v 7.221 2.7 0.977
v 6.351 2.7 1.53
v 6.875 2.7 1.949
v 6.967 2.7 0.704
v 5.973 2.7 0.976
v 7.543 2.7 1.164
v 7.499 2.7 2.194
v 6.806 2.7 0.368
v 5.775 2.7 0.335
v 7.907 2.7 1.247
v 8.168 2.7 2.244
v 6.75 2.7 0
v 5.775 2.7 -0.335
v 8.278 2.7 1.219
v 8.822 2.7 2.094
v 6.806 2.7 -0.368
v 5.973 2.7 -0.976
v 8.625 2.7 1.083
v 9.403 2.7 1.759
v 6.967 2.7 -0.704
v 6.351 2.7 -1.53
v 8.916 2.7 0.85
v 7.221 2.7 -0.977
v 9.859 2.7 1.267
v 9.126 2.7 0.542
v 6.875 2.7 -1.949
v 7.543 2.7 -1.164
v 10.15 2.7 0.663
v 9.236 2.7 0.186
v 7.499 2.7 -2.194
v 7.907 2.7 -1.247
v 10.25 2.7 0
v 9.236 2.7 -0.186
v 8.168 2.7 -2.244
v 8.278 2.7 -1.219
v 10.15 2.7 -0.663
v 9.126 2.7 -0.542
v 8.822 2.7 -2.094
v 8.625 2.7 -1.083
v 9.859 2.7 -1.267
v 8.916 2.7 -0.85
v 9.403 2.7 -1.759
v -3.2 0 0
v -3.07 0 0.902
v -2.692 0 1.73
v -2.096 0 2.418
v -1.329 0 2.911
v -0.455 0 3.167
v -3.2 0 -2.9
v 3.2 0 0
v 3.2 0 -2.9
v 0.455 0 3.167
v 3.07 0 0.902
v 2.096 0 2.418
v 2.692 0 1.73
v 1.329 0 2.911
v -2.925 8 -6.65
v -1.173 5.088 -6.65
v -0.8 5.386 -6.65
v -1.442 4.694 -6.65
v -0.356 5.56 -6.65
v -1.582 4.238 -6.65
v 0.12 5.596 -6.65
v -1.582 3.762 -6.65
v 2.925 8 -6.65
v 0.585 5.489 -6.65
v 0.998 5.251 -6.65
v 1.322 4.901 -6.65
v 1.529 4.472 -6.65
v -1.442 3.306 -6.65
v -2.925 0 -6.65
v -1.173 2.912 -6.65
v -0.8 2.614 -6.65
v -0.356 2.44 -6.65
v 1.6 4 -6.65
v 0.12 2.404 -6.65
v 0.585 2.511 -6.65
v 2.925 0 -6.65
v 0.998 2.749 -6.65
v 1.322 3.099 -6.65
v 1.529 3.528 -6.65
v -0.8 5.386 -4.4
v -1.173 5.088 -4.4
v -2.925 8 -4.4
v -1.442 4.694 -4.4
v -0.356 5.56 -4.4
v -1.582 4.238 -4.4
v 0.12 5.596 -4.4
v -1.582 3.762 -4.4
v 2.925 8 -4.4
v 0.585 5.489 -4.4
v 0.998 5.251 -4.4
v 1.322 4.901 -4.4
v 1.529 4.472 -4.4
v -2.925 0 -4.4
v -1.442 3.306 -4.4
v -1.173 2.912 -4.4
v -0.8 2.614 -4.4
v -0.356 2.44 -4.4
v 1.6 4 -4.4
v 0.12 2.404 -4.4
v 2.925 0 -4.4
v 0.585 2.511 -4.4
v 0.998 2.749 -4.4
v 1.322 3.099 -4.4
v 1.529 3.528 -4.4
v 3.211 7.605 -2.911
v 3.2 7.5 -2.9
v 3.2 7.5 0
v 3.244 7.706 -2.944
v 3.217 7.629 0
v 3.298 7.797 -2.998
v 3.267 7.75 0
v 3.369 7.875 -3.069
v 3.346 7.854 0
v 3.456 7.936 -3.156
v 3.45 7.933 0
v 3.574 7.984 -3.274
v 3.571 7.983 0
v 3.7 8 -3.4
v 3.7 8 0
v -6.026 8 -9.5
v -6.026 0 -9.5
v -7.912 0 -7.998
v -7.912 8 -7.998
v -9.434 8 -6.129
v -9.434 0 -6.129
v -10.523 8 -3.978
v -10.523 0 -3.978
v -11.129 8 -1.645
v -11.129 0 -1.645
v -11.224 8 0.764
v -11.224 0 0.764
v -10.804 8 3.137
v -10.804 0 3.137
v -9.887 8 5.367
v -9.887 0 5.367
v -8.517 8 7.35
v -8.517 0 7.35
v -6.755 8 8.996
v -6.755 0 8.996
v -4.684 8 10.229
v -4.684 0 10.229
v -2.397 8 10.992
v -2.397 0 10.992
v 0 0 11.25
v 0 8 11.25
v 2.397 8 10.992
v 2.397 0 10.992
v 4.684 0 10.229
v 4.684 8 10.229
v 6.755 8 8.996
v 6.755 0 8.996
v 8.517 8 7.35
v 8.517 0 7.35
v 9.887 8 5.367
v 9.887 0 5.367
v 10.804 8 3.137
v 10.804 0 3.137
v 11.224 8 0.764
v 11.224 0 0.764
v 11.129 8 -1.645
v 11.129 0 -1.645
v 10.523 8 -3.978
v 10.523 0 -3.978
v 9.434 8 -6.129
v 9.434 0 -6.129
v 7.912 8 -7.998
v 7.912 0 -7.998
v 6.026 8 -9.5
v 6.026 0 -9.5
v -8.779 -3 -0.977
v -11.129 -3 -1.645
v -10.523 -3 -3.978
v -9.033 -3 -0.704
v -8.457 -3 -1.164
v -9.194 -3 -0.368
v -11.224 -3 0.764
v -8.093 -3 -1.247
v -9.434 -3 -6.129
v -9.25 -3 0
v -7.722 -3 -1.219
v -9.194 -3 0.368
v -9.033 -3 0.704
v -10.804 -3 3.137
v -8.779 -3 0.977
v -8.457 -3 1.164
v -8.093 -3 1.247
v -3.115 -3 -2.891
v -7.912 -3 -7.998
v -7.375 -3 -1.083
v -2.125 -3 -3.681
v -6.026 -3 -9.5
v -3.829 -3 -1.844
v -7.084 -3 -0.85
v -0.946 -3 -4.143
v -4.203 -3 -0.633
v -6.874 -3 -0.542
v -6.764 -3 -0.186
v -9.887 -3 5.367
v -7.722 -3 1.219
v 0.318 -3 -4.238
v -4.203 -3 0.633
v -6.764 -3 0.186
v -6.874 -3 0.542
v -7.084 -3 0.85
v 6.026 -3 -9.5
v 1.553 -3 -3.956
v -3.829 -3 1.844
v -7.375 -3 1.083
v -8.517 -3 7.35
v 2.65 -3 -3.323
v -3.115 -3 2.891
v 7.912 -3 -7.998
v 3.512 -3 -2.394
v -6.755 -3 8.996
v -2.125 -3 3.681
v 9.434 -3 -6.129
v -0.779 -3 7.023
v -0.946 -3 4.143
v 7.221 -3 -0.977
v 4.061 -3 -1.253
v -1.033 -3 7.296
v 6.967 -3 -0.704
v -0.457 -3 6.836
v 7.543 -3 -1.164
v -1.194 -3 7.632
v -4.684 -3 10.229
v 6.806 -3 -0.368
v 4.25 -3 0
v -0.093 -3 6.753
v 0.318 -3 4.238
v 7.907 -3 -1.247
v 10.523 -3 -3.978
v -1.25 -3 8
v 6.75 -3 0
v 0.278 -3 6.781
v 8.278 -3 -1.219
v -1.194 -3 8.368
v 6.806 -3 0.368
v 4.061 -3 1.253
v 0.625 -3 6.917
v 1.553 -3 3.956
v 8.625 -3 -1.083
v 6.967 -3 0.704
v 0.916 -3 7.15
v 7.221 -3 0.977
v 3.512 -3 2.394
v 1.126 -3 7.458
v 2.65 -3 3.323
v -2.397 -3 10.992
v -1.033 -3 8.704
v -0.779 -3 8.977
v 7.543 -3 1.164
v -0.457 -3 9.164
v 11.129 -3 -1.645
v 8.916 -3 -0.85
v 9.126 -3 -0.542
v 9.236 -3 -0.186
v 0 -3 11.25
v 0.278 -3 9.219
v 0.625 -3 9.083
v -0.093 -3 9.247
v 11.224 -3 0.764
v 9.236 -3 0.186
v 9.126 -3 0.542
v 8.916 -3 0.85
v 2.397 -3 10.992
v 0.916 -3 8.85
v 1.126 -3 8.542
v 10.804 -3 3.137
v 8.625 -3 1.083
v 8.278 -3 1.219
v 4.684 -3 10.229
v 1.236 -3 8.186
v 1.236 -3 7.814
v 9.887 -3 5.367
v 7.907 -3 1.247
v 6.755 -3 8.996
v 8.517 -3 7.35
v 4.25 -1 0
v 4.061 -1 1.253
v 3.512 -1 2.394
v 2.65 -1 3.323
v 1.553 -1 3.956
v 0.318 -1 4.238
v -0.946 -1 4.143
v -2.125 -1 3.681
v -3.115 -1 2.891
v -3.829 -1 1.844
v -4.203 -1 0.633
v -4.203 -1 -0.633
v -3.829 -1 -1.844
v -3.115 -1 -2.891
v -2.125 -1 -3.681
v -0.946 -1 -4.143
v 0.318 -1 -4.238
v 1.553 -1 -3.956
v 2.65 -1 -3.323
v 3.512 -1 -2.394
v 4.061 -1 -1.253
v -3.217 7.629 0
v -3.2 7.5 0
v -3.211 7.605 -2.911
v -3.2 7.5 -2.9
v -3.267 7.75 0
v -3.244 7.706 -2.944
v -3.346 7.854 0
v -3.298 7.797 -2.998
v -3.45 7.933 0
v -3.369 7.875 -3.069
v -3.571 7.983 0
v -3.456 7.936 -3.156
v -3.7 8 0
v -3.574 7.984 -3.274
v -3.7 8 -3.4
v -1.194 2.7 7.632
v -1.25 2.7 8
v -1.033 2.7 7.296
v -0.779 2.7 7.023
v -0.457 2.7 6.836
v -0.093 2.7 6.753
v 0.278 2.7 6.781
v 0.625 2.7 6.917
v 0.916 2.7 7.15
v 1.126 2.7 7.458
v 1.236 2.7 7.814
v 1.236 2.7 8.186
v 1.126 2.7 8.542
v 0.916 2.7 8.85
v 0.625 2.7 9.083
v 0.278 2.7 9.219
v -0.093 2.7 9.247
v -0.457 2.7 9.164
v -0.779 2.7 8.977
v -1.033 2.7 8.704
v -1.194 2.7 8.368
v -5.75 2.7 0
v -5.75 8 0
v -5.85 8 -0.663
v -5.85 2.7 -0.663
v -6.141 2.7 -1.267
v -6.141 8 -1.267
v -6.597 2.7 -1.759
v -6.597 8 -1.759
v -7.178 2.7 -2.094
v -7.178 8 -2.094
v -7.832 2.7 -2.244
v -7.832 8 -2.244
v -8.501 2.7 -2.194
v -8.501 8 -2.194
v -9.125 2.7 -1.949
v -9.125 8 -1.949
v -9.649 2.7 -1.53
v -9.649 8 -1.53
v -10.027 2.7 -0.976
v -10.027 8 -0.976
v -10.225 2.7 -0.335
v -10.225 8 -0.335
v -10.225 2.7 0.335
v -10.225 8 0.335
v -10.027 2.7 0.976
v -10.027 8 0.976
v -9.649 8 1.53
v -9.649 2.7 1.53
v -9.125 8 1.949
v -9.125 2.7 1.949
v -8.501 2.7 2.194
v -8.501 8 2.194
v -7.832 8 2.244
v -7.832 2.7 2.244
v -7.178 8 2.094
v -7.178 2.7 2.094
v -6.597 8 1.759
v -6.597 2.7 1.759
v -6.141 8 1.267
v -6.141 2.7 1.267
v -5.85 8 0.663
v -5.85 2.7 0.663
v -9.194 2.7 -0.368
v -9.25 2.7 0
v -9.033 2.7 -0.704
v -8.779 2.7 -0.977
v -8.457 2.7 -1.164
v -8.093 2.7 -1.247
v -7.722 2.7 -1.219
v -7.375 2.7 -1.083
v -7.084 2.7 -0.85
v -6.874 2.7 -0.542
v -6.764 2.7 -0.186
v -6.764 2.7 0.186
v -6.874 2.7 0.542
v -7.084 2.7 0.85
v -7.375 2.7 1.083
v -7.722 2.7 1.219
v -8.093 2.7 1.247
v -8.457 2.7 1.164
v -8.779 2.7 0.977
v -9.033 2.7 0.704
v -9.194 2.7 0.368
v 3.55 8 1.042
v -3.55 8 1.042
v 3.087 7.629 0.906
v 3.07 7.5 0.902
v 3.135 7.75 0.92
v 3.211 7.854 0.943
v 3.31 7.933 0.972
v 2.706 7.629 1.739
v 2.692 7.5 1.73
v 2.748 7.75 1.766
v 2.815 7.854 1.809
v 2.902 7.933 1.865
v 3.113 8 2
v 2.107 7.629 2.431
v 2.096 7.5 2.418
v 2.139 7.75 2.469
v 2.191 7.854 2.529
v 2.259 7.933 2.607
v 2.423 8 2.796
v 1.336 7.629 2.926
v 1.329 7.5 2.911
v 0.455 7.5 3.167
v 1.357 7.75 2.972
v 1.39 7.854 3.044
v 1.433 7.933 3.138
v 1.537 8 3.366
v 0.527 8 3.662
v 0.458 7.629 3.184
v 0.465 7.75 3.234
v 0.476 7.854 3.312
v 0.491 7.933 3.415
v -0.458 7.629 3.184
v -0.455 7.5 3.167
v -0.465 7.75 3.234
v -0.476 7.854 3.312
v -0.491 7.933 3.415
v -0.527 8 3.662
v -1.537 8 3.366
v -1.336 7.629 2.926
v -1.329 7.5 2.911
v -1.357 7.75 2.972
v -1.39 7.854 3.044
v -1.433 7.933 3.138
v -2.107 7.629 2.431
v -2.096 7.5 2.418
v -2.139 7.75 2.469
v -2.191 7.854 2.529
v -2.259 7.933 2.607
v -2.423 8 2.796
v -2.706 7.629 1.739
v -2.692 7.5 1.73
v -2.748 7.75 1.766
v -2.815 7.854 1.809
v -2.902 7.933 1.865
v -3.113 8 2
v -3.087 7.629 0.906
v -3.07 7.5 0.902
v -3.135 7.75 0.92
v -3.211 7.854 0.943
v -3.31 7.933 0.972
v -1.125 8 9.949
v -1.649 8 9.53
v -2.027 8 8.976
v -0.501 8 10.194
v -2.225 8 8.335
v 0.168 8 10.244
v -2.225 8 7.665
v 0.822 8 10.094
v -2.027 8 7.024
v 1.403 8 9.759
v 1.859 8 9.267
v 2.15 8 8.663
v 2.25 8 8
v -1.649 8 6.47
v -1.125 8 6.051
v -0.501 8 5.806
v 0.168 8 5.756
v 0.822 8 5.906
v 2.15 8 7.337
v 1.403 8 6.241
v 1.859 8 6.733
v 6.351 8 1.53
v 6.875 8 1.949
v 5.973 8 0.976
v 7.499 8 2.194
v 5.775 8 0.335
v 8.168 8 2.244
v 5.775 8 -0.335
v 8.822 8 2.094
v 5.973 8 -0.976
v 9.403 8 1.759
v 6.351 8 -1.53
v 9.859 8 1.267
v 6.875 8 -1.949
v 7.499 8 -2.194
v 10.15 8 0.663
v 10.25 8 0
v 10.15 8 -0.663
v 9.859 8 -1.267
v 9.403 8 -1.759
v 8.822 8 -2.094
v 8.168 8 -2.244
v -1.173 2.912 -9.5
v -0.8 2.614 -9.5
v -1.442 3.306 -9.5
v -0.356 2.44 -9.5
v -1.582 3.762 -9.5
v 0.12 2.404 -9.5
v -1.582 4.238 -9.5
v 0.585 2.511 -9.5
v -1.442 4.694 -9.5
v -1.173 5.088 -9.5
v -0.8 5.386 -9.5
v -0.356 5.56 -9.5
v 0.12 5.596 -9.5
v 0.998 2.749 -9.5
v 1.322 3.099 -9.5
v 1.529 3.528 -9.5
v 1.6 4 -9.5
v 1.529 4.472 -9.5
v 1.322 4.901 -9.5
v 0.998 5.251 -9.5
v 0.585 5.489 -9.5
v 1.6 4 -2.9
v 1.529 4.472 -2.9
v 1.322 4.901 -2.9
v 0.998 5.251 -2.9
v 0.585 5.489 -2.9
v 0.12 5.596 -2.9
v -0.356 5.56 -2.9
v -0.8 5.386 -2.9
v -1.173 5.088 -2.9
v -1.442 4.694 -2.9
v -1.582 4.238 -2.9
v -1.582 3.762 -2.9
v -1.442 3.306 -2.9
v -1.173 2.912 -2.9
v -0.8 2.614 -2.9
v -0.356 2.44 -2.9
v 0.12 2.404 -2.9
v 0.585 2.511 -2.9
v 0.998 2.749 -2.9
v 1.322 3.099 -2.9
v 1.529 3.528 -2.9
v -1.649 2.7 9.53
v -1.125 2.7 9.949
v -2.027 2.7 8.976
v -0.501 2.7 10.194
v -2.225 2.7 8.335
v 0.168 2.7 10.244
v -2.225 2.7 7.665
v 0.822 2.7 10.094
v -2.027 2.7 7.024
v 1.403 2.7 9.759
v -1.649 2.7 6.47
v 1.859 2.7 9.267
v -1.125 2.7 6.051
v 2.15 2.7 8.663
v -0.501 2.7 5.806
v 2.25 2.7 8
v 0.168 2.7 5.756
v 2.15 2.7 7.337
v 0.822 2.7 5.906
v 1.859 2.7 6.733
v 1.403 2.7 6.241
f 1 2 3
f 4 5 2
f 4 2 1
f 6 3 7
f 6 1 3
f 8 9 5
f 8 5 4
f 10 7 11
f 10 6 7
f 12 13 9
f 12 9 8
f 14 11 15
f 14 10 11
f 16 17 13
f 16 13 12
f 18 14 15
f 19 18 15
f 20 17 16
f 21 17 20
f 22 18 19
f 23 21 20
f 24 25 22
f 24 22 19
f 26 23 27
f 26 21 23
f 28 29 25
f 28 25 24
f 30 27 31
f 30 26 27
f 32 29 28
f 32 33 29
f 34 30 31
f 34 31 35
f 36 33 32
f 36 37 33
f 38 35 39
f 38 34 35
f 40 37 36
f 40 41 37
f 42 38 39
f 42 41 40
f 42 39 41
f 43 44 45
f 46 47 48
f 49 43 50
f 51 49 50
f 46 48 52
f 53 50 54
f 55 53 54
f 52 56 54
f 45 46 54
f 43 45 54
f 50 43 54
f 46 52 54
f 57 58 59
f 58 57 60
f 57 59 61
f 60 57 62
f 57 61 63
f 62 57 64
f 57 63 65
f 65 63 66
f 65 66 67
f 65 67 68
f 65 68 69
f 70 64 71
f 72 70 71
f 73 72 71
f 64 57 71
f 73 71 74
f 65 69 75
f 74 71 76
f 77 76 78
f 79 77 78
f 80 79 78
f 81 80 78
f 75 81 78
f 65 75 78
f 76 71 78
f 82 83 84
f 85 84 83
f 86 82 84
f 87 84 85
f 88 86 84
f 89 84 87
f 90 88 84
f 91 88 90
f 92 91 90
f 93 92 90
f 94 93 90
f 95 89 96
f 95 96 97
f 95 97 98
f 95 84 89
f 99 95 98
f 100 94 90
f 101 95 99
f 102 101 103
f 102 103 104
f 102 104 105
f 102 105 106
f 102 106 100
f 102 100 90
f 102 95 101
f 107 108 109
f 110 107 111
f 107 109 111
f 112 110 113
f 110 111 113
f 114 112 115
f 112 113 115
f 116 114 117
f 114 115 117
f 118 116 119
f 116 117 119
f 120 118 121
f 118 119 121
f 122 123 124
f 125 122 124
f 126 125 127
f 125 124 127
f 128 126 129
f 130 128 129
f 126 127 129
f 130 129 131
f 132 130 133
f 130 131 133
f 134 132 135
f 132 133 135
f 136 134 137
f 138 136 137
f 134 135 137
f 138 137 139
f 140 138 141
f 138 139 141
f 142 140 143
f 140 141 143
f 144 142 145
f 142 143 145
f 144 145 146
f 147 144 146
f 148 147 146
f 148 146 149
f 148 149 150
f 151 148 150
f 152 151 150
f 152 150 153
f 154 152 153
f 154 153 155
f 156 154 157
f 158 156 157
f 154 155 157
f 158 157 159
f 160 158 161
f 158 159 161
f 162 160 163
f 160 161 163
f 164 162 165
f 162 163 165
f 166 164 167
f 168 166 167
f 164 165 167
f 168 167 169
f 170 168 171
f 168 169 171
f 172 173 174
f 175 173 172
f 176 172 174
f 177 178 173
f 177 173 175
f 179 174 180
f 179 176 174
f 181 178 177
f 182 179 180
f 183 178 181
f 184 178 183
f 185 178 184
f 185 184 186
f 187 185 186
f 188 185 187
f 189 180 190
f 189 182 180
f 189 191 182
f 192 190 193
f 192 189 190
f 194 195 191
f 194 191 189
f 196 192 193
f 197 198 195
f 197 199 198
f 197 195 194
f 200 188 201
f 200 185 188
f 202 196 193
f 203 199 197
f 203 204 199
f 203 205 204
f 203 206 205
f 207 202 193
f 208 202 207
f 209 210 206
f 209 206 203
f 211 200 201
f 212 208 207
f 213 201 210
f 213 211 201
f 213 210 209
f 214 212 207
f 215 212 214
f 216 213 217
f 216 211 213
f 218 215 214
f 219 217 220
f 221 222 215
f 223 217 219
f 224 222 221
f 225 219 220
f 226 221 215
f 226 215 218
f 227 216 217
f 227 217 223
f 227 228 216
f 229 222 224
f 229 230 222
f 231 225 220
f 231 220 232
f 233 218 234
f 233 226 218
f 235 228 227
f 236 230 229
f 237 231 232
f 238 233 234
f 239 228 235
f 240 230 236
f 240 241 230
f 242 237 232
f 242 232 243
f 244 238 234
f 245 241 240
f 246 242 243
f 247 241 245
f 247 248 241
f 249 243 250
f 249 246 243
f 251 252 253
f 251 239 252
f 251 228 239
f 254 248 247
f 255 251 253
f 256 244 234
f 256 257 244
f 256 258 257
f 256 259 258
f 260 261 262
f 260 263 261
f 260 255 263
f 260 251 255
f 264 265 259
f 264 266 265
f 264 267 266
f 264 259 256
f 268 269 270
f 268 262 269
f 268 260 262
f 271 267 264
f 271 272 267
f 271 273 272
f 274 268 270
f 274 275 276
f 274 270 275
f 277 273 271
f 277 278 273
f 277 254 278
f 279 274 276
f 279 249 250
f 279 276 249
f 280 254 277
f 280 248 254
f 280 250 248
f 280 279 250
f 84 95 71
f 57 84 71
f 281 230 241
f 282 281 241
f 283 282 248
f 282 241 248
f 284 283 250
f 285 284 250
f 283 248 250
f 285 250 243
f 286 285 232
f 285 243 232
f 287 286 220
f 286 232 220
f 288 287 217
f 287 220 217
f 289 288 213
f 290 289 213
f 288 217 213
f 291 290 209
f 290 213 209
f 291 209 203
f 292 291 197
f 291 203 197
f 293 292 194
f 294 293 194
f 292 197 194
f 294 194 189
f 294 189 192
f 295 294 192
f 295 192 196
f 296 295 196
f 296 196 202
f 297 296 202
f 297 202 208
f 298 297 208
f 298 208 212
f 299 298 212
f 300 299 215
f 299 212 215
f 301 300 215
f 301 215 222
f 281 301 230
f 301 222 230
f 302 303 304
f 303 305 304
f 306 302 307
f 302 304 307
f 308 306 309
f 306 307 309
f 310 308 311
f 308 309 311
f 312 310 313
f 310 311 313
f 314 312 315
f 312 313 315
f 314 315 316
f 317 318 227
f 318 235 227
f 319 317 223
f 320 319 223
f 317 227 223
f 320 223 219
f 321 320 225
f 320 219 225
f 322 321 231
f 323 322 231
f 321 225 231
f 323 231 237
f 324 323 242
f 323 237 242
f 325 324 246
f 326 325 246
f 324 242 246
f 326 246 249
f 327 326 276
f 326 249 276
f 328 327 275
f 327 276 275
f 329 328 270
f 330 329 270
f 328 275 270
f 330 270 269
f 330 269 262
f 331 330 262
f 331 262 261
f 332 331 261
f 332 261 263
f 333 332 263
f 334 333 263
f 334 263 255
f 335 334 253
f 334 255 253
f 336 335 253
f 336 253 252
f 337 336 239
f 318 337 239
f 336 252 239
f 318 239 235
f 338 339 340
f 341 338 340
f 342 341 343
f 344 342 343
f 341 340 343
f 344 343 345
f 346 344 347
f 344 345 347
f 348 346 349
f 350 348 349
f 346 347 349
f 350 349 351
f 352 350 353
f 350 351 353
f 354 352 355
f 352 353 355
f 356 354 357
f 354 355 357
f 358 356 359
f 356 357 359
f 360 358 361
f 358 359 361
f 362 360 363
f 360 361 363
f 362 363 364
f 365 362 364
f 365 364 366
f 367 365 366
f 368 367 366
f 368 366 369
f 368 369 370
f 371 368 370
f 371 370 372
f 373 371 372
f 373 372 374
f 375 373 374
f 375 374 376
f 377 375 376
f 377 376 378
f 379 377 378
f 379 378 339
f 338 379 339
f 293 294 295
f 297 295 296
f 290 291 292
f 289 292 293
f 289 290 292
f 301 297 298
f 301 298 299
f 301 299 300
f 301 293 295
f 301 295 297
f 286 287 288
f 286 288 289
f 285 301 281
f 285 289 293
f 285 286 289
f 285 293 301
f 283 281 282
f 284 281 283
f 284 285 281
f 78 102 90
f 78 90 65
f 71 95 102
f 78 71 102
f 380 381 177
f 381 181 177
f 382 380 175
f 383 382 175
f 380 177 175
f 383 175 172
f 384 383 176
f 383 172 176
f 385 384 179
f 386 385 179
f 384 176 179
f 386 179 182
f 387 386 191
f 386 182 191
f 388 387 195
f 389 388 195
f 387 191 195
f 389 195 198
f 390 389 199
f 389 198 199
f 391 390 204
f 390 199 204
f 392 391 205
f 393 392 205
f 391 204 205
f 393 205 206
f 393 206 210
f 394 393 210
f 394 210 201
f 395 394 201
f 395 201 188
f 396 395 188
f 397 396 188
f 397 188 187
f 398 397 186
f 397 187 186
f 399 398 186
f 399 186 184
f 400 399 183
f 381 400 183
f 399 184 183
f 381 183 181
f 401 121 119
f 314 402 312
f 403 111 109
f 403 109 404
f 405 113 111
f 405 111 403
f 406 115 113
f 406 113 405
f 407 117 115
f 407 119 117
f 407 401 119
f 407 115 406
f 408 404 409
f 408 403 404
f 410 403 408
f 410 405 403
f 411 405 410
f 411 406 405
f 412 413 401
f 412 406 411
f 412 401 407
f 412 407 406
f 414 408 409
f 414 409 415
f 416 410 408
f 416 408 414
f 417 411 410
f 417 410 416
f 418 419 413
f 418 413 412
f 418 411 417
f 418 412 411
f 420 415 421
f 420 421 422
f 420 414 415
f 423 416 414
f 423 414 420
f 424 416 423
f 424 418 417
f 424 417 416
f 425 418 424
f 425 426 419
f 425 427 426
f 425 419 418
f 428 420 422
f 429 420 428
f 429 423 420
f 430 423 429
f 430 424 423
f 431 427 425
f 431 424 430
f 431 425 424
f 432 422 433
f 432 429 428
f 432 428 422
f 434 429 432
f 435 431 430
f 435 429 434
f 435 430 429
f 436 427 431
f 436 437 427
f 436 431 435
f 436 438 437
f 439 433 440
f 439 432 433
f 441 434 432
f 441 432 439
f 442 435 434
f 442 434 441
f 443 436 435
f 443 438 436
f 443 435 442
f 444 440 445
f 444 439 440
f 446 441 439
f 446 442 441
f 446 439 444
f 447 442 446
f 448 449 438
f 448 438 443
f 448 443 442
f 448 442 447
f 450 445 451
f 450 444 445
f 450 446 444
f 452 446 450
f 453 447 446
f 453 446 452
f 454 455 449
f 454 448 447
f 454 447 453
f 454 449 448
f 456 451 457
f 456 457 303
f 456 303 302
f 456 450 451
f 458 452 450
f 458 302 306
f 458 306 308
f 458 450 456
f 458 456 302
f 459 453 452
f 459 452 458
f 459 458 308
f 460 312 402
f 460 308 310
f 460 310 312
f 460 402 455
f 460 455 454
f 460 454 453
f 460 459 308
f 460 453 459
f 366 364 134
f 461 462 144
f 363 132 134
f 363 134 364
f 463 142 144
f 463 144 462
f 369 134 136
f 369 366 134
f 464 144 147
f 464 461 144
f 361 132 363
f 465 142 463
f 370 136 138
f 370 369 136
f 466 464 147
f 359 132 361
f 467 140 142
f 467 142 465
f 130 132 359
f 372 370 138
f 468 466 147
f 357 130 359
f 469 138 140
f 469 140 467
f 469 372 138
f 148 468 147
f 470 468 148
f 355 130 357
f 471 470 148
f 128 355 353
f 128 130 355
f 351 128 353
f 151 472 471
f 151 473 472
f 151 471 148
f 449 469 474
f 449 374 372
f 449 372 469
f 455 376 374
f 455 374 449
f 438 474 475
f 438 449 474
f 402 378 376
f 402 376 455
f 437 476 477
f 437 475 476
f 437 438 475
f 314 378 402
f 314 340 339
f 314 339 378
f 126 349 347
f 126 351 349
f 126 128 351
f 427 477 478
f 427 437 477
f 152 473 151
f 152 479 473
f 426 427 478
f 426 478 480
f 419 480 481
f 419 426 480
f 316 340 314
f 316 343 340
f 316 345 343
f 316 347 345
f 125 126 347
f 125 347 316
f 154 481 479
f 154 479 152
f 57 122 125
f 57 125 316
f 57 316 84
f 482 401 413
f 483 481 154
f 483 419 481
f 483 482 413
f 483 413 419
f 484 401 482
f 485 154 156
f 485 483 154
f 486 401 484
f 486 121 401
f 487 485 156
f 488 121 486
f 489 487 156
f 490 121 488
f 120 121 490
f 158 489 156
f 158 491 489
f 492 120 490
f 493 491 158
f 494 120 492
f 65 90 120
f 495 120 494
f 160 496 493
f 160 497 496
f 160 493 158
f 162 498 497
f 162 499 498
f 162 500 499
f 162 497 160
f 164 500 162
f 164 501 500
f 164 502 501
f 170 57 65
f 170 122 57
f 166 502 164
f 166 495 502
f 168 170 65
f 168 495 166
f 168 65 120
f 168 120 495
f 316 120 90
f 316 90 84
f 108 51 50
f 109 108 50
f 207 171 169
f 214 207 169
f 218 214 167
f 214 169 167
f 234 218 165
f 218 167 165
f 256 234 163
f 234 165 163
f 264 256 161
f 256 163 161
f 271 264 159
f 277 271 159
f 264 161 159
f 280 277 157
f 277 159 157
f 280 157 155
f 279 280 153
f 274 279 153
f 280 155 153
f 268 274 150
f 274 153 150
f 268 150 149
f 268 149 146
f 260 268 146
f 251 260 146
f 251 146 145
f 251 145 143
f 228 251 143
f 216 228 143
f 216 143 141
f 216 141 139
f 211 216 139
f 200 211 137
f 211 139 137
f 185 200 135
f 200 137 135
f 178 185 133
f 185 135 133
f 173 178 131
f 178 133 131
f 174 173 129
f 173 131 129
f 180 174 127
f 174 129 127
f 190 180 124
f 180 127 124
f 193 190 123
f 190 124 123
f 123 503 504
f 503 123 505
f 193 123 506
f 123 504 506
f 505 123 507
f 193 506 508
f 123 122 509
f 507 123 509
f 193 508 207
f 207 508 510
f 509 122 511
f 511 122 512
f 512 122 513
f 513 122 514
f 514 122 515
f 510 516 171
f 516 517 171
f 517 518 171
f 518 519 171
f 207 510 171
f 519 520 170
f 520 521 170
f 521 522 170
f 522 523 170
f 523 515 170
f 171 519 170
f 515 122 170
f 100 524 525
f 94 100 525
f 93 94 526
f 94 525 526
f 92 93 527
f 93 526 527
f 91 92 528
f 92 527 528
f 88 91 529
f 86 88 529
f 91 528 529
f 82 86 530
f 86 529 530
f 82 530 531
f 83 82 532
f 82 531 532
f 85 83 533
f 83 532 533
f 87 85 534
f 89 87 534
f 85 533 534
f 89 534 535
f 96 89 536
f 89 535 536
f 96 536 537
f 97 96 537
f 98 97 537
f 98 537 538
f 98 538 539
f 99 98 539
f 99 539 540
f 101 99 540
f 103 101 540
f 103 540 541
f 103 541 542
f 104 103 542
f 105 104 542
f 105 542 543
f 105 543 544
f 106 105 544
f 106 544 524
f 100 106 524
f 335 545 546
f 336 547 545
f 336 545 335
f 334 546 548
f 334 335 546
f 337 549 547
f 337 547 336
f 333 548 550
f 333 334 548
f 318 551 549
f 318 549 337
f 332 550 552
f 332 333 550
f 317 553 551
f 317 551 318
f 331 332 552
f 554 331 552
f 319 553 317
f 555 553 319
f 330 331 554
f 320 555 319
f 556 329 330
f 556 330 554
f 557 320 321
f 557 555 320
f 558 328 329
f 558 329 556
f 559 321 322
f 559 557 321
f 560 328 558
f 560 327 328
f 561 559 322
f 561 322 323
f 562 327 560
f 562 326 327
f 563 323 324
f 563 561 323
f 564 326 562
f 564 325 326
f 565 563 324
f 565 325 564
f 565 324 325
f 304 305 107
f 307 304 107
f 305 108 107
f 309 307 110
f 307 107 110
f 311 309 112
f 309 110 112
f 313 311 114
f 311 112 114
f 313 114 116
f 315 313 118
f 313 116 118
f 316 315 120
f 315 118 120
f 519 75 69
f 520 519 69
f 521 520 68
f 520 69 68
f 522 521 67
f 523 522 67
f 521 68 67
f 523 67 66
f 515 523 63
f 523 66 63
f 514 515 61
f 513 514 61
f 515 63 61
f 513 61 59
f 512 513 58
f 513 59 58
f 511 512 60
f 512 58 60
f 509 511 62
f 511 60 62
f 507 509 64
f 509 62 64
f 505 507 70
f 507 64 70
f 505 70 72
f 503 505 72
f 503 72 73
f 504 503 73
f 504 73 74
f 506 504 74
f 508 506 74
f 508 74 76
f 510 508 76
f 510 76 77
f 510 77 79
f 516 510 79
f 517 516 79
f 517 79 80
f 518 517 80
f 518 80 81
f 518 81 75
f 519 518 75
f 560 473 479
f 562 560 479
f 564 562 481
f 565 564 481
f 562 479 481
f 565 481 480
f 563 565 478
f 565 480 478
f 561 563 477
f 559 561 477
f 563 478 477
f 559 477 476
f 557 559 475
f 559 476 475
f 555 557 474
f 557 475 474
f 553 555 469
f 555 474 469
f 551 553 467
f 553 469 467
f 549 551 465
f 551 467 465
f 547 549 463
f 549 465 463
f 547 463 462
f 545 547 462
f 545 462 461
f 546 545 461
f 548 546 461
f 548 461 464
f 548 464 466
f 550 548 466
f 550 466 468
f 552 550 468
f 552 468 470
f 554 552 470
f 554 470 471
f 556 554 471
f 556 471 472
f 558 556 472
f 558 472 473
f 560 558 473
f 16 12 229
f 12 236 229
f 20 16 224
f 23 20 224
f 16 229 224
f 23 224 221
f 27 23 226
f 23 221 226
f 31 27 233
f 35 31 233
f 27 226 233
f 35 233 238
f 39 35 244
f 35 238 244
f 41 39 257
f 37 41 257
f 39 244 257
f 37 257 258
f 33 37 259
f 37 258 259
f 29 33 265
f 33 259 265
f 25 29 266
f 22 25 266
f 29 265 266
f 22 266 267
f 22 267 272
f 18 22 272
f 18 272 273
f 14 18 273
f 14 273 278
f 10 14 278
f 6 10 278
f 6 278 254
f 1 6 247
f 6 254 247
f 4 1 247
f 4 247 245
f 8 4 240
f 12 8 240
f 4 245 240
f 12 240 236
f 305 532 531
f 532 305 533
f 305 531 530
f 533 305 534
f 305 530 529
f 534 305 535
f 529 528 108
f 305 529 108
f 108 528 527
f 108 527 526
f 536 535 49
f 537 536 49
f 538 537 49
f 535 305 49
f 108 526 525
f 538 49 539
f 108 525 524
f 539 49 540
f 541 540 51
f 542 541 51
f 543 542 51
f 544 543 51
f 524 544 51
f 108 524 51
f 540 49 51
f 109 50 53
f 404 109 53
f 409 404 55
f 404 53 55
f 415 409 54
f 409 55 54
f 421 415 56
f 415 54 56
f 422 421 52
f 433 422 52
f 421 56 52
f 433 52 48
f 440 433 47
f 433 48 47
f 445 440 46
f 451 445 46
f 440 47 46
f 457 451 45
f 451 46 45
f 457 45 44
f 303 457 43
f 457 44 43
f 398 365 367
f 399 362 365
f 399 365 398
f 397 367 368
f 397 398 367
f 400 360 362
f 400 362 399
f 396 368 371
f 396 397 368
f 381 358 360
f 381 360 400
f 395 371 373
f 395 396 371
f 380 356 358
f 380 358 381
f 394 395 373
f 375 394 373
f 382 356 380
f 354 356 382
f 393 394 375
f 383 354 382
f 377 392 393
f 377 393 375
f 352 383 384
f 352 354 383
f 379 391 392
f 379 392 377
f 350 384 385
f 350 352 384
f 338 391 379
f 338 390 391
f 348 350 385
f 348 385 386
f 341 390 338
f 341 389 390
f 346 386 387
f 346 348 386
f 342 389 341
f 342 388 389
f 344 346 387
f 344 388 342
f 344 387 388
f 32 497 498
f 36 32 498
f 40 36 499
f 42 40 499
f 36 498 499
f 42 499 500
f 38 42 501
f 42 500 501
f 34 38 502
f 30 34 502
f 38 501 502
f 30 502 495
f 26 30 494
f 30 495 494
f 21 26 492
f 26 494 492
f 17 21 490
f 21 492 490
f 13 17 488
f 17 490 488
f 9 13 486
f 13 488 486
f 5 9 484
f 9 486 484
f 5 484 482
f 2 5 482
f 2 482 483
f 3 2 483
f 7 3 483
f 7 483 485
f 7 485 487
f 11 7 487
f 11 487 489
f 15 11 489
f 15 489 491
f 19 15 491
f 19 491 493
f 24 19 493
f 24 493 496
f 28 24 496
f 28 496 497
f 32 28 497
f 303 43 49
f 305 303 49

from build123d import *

# Parameters (mm, degrees)
BOSS_EXTRU_1_DEPTH                              = 8
CONG_1_R                                        = 0.5
ESQUISSE6_R                                     = 1.6
ENL_V_MAT_EXTRU_1_DEPTH                         = 10.5
ESQUISSE7_W                                     = 5.85
ESQUISSE7_H                                     = 2.25
ENL_V_MAT_EXTRU_2_DEPTH                         = 9.0000001
BOSS_EXTRU_2_DEPTH                              = 3
CHAMBRAGE_POUR_VIS_T_TE_CYLINDRIQUE_D           = 2.5
CHAMBRAGE_POUR_VIS_T_TE_CYLINDRIQUE_CBORE_D     = 4.5
CHAMBRAGE_POUR_VIS_T_TE_CYLINDRIQUE_CBORE_DEPTH = 5.3
ESQUISSE14_R                                    = 4.25
ENL_V_MAT_EXTRU_3_DEPTH                         = 2


with BuildPart() as part:
    # Esquisse1 → Boss.-Extru.1 (new body)
    with BuildSketch(Plane(origin=(0, 0, 0), x_dir=(1, 0, 0), z_dir=(0, 1, 0))):
        with BuildLine():
            Line((6.025985397, 9.5), (-6.025985397, 9.5))
            ThreePointArc((-6.025985397, 9.5), (0, -11.25), (6.025985397, 9.5))
        make_face()
        with BuildLine():
            Line((-3.2, 0), (-3.2, 2.9))
            Line((-3.2, 2.9), (3.2, 2.9))
            Line((3.2, 2.9), (3.2, 0))
            ThreePointArc((3.2, 0), (0, -3.2), (-3.2, 0))
        make_face(mode=Mode.SUBTRACT)
    extrude(amount=BOSS_EXTRU_1_DEPTH)

    # Congé1
    cong_1_edges = [part.edges().sort_by_distance(p)[0] for p in [
        (0, 8, 3.2),
        (3.2, 8, -1.45),
        (0, 8, -2.9),
        (-3.2, 8, -1.45),
    ]]
    fillet(cong_1_edges, radius=CONG_1_R)

    # Esquisse6 → Enlèv. mat.-Extru.1 (cut, through all)
    with BuildSketch(Plane.XY):
        with Locations((0, 4)):
            Circle(ESQUISSE6_R)
    extrude(amount=-ENL_V_MAT_EXTRU_1_DEPTH, mode=Mode.SUBTRACT)

    # Esquisse7 → Enlèv. mat.-Extru.2 (cut, through all)
    with BuildSketch(Plane(origin=(0, 0, 0), x_dir=(1, 0, 0), z_dir=(0, 1, 0))):
        with Locations((0, 5.525)):
            Rectangle(ESQUISSE7_W, ESQUISSE7_H)
    extrude(amount=ENL_V_MAT_EXTRU_2_DEPTH, mode=Mode.SUBTRACT)

    # Esquisse8 → Boss.-Extru.2 (add)
    with BuildSketch(Plane.XZ):
        with BuildLine():
            Line((-6.025985397, -9.5), (6.025985397, -9.5))
            ThreePointArc((6.025985397, -9.5), (0, 11.25), (-6.025985397, -9.5))
        make_face()
    extrude(amount=BOSS_EXTRU_2_DEPTH)

    # Chambrage pour vis à tête cylindrique à 6 pans creux (ou vis CHC) M21 (through all)
    with Locations(Plane(origin=(0, 8, 0), x_dir=(1, 0, 0), z_dir=(0, 1, 0))):
        with Locations((-8, 0), (0, -8), (8, 0)):
            CounterBoreHole(CHAMBRAGE_POUR_VIS_T_TE_CYLINDRIQUE_D / 2, CHAMBRAGE_POUR_VIS_T_TE_CYLINDRIQUE_CBORE_D / 2, CHAMBRAGE_POUR_VIS_T_TE_CYLINDRIQUE_CBORE_DEPTH)

    # Esquisse14 → Enlèv. mat.-Extru.3 (cut)
    with BuildSketch(Plane.XZ.offset(3)):
        Circle(ESQUISSE14_R)
    extrude(amount=-ENL_V_MAT_EXTRU_3_DEPTH, mode=Mode.SUBTRACT)


solid = part.part
